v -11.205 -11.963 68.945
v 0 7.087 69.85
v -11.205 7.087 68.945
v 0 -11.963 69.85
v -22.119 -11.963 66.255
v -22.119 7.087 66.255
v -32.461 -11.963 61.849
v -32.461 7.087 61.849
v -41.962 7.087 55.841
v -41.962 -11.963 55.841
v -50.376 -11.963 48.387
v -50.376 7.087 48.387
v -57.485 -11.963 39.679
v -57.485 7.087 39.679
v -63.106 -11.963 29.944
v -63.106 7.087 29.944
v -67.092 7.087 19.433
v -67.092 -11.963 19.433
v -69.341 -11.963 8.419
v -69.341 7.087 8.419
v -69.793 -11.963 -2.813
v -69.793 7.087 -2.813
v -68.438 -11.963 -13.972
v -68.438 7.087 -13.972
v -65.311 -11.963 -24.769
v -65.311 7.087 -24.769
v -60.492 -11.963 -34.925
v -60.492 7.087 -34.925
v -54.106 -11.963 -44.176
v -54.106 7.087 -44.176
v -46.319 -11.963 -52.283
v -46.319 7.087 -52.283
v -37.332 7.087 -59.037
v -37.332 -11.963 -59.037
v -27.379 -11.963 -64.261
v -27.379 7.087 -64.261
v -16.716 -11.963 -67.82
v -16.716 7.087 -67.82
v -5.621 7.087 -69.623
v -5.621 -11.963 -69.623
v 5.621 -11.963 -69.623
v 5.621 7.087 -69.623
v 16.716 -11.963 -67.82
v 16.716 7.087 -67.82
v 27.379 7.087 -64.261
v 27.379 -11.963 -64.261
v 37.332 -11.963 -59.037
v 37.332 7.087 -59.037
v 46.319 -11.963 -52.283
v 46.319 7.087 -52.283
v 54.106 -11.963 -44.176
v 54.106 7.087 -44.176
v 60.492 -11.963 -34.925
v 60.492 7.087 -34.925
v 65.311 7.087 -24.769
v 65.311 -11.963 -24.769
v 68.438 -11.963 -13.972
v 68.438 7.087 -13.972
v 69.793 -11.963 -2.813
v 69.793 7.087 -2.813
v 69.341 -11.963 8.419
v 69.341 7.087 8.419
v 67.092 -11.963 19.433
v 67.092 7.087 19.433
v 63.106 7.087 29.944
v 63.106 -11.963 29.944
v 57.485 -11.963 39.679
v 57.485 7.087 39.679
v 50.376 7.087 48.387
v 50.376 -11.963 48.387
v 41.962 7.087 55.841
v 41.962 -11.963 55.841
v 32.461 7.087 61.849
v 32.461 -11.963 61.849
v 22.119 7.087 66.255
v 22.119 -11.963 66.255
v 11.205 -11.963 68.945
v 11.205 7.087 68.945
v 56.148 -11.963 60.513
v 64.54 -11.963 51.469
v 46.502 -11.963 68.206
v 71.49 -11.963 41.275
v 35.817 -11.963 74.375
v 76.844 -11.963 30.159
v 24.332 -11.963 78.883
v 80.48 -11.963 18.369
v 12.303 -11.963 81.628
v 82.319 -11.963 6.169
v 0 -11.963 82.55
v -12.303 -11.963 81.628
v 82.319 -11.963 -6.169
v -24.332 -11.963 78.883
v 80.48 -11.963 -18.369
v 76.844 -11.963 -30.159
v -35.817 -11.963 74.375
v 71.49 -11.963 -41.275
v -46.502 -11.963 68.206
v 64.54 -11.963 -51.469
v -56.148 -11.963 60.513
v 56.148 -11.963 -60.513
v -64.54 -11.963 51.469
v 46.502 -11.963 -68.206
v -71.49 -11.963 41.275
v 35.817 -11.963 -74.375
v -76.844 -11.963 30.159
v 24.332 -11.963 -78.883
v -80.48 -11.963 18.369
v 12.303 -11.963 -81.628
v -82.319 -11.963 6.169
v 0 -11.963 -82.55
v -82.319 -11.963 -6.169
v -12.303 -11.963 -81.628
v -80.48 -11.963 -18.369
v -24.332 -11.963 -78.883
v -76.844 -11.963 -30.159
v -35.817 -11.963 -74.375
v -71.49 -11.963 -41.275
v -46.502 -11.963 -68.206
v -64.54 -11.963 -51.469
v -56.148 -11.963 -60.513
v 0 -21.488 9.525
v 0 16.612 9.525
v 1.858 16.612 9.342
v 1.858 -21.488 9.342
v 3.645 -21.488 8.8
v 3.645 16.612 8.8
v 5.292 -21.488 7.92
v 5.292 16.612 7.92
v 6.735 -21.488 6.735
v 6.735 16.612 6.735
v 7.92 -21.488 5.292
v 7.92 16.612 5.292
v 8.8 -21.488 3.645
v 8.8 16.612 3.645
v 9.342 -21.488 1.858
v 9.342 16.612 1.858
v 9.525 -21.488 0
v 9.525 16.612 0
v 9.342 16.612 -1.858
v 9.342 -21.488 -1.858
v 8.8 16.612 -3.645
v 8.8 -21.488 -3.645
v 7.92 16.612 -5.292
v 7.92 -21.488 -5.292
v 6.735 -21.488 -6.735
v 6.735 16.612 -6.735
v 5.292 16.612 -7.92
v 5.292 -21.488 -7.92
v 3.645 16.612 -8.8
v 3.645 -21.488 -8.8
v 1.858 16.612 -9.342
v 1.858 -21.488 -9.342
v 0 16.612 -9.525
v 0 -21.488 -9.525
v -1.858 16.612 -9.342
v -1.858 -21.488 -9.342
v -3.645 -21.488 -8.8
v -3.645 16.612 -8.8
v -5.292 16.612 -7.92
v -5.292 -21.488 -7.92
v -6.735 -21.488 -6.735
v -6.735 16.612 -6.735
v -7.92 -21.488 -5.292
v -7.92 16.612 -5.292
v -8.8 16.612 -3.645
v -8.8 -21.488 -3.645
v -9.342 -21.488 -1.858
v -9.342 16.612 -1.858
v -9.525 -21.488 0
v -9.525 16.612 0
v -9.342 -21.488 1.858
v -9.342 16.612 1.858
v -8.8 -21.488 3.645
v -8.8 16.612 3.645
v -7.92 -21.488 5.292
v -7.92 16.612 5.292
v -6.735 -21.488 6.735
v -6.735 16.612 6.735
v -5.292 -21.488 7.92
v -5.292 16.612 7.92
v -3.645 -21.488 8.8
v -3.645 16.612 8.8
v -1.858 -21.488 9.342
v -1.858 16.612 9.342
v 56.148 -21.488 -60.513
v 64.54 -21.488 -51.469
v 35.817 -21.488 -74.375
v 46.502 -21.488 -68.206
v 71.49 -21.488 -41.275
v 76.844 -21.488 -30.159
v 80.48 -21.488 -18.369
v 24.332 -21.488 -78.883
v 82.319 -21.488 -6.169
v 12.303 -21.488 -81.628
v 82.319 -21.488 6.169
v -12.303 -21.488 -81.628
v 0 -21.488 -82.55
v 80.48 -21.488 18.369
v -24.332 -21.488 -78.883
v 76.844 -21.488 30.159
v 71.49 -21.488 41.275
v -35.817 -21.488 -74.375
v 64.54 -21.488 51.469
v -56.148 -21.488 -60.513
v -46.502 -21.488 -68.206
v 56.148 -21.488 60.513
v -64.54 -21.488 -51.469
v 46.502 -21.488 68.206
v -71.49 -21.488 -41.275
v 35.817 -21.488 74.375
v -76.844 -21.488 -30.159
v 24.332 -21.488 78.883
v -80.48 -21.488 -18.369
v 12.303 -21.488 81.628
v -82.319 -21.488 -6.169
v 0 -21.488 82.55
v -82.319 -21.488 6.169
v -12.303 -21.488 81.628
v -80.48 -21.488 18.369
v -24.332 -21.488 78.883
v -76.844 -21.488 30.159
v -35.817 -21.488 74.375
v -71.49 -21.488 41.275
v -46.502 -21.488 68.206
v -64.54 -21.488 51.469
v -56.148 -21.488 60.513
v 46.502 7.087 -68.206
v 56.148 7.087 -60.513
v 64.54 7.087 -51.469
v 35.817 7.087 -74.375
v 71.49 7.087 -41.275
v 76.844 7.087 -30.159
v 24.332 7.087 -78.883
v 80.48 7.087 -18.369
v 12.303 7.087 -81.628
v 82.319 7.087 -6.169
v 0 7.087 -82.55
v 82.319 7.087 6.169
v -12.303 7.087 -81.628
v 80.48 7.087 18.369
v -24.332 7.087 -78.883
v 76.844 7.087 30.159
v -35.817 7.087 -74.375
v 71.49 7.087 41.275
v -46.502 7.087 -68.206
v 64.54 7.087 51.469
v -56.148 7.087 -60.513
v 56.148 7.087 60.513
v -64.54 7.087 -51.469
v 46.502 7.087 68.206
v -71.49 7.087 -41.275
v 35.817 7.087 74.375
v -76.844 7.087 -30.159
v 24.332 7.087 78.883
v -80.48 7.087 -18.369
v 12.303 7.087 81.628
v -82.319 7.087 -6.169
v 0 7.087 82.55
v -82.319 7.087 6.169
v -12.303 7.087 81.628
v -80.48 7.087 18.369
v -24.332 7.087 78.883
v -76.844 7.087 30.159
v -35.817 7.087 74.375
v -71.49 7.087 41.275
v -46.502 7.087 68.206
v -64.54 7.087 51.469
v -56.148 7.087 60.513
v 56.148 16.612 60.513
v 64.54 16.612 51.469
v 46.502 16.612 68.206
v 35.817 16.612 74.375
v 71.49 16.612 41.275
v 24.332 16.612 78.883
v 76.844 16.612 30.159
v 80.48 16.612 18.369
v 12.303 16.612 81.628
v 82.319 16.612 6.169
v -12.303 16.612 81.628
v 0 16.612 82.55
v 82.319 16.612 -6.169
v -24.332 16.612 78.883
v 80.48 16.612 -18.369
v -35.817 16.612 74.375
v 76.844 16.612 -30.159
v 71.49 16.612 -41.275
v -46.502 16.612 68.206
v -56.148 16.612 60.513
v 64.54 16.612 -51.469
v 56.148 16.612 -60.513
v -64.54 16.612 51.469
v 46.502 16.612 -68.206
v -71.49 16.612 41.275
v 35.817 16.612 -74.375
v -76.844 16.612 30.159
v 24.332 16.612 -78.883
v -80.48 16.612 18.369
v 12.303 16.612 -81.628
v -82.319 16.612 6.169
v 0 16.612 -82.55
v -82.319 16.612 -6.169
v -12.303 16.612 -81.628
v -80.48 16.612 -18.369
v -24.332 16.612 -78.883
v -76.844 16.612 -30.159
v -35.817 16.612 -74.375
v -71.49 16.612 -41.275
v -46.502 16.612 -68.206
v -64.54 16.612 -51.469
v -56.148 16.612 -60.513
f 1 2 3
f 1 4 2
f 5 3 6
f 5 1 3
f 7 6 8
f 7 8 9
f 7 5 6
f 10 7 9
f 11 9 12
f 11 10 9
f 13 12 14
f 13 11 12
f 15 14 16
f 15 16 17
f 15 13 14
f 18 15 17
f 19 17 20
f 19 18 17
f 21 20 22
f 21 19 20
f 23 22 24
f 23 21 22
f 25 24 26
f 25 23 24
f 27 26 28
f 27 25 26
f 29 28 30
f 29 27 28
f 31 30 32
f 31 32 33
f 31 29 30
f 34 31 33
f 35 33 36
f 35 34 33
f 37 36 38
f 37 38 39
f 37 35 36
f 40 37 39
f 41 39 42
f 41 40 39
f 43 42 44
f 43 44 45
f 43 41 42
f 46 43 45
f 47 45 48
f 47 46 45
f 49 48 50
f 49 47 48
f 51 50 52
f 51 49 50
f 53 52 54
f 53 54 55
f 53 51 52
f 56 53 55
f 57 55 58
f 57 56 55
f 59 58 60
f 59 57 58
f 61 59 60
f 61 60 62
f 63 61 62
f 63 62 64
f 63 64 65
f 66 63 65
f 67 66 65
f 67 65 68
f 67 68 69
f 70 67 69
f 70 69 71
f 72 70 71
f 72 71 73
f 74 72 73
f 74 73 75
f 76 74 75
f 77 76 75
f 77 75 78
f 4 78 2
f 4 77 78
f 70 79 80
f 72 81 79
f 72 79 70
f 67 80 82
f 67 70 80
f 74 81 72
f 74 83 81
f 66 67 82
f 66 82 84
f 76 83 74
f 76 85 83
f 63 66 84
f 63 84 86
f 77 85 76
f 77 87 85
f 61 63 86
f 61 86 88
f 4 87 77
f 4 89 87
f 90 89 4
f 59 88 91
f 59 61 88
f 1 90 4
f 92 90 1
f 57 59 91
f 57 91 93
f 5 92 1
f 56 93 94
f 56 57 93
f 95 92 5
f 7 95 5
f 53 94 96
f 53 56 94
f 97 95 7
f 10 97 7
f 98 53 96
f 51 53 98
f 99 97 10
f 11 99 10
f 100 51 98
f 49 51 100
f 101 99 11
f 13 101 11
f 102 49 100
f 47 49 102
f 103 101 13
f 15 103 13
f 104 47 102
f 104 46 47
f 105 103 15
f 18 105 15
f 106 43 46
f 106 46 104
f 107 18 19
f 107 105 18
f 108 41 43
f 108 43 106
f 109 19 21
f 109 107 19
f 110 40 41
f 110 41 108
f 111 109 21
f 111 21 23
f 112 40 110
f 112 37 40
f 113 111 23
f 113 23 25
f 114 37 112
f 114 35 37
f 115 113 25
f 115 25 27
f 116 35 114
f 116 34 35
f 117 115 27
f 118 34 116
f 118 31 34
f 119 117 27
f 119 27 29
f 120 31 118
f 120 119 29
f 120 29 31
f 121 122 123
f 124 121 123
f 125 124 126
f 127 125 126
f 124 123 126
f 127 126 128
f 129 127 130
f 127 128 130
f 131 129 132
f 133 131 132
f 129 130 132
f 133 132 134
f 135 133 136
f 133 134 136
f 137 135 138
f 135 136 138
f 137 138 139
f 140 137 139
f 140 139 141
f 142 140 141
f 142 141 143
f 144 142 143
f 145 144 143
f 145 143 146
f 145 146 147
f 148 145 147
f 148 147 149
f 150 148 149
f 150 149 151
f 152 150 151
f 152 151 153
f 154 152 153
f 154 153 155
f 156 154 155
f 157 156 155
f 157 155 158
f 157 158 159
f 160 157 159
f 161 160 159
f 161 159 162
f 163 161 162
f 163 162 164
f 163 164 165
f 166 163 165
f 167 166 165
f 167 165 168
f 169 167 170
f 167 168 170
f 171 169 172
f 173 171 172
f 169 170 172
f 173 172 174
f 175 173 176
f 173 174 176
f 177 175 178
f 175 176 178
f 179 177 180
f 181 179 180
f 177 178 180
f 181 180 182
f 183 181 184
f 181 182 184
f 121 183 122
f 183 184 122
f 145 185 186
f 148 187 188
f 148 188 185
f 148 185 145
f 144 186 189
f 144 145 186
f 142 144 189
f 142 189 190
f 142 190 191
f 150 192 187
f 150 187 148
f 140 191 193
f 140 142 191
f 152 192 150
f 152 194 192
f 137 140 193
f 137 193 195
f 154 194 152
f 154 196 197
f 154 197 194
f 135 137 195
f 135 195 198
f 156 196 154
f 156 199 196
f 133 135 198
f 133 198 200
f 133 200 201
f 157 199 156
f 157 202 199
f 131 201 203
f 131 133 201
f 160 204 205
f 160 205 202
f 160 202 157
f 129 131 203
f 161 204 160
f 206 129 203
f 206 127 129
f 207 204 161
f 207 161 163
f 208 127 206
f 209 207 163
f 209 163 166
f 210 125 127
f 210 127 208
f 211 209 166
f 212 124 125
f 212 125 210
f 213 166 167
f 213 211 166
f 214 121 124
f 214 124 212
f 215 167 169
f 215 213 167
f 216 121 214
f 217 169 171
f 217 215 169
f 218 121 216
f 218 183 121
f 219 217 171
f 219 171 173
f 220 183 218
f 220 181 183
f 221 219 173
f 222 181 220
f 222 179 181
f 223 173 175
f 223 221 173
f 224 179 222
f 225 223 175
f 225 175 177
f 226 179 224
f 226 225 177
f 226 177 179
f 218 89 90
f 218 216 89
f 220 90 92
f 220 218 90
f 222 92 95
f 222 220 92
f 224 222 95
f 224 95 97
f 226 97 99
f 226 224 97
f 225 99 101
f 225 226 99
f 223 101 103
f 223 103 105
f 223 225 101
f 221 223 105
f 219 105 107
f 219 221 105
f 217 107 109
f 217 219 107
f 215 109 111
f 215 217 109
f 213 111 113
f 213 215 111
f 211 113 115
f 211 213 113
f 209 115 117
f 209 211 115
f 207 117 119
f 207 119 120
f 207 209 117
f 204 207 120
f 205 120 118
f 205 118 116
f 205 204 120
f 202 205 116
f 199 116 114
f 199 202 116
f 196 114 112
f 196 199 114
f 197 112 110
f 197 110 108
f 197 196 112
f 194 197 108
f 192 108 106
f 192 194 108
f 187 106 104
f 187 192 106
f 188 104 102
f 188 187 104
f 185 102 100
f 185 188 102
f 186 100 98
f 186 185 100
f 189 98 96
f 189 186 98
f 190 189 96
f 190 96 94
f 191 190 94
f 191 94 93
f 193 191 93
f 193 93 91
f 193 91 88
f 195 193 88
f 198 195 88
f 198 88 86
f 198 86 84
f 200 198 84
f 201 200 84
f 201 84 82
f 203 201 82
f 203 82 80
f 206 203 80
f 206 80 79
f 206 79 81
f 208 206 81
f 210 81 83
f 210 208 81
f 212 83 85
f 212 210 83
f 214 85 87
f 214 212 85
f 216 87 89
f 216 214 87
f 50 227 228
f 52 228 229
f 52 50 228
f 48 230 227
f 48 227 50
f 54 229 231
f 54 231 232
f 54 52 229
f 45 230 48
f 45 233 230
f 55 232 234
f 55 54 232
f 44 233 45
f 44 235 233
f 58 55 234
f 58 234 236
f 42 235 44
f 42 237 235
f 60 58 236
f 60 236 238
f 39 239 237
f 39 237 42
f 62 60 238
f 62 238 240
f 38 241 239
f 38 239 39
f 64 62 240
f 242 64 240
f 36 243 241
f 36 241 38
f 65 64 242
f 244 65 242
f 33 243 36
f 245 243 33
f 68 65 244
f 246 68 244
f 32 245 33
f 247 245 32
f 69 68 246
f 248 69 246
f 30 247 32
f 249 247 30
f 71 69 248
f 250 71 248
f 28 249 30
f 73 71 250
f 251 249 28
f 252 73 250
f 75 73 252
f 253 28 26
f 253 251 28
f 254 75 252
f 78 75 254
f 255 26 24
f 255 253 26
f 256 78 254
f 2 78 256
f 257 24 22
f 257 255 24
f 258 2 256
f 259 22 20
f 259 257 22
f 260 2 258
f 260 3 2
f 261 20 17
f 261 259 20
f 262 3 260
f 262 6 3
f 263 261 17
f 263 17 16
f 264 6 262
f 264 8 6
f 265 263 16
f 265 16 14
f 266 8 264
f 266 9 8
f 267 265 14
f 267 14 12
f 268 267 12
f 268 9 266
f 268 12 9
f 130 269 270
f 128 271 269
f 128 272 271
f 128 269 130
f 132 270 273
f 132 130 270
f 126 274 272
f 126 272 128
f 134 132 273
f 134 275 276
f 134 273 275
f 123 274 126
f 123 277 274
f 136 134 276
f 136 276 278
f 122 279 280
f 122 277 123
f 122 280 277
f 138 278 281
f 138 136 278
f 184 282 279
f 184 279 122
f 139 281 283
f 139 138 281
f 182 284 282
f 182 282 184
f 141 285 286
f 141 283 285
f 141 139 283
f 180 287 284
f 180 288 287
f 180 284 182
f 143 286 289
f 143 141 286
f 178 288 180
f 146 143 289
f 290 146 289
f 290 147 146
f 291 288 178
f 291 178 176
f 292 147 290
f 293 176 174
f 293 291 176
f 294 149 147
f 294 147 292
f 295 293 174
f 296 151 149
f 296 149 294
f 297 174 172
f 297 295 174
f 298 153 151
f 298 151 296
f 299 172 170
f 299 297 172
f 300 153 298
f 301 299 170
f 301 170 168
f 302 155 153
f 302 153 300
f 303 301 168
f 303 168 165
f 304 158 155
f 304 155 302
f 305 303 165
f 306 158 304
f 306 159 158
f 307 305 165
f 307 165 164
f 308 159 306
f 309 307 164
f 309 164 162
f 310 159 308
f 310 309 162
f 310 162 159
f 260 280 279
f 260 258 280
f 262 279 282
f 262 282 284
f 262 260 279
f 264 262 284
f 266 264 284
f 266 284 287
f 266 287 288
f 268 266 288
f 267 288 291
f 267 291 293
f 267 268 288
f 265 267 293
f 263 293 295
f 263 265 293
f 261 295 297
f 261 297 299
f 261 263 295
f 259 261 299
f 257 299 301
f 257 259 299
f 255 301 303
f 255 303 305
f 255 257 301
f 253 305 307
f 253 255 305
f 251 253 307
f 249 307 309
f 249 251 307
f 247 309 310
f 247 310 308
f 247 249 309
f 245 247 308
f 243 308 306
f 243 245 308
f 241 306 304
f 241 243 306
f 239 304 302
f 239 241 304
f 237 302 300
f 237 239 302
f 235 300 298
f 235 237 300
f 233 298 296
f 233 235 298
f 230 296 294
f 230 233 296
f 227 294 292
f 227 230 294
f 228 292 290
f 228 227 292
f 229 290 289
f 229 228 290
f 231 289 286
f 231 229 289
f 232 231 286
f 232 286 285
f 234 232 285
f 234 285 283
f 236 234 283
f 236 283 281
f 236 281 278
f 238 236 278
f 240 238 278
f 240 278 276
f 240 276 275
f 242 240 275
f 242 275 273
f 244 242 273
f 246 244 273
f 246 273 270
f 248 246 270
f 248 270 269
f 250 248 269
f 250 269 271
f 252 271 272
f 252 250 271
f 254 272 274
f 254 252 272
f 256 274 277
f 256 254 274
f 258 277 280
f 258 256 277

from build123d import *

# Parameters (mm, degrees)
SKETCH4_R          = 9.525
CUT_EXTRUDE1_DEPTH = 123.803155497


with BuildPart() as part:
    # Sketch2 → Revolve1 (revolve)
    with BuildSketch(Plane.XY, mode=Mode.PRIVATE) as revolve1_sk:
        Polygon((0, 16.611620209), (-82.55, 16.611620209), (-82.55, 7.086620209), (-69.85, 7.086620209), (-69.85, -11.963379791), (-82.55, -11.963379791), (-82.55, -21.488379791), (0, -21.488379791), align=None)
    revolve(revolve1_sk.sketch.rotate(Axis((0, 36.56493994, 0), (0, -1, 0)), 270), axis=Axis((0, 36.56493994, 0), (0, -1, 0)))

    # Sketch4 → Cut-Extrude1 (cut, through all)
    with BuildSketch(Plane(origin=(0, 16.611620209, 0), x_dir=(1, 0, 0), z_dir=(0, 1, 0))):
        with Locations(Location((0, 0, 0), (0, 0, 270))):
            Circle(SKETCH4_R)
    extrude(amount=-CUT_EXTRUDE1_DEPTH, mode=Mode.SUBTRACT)


solid = part.part
